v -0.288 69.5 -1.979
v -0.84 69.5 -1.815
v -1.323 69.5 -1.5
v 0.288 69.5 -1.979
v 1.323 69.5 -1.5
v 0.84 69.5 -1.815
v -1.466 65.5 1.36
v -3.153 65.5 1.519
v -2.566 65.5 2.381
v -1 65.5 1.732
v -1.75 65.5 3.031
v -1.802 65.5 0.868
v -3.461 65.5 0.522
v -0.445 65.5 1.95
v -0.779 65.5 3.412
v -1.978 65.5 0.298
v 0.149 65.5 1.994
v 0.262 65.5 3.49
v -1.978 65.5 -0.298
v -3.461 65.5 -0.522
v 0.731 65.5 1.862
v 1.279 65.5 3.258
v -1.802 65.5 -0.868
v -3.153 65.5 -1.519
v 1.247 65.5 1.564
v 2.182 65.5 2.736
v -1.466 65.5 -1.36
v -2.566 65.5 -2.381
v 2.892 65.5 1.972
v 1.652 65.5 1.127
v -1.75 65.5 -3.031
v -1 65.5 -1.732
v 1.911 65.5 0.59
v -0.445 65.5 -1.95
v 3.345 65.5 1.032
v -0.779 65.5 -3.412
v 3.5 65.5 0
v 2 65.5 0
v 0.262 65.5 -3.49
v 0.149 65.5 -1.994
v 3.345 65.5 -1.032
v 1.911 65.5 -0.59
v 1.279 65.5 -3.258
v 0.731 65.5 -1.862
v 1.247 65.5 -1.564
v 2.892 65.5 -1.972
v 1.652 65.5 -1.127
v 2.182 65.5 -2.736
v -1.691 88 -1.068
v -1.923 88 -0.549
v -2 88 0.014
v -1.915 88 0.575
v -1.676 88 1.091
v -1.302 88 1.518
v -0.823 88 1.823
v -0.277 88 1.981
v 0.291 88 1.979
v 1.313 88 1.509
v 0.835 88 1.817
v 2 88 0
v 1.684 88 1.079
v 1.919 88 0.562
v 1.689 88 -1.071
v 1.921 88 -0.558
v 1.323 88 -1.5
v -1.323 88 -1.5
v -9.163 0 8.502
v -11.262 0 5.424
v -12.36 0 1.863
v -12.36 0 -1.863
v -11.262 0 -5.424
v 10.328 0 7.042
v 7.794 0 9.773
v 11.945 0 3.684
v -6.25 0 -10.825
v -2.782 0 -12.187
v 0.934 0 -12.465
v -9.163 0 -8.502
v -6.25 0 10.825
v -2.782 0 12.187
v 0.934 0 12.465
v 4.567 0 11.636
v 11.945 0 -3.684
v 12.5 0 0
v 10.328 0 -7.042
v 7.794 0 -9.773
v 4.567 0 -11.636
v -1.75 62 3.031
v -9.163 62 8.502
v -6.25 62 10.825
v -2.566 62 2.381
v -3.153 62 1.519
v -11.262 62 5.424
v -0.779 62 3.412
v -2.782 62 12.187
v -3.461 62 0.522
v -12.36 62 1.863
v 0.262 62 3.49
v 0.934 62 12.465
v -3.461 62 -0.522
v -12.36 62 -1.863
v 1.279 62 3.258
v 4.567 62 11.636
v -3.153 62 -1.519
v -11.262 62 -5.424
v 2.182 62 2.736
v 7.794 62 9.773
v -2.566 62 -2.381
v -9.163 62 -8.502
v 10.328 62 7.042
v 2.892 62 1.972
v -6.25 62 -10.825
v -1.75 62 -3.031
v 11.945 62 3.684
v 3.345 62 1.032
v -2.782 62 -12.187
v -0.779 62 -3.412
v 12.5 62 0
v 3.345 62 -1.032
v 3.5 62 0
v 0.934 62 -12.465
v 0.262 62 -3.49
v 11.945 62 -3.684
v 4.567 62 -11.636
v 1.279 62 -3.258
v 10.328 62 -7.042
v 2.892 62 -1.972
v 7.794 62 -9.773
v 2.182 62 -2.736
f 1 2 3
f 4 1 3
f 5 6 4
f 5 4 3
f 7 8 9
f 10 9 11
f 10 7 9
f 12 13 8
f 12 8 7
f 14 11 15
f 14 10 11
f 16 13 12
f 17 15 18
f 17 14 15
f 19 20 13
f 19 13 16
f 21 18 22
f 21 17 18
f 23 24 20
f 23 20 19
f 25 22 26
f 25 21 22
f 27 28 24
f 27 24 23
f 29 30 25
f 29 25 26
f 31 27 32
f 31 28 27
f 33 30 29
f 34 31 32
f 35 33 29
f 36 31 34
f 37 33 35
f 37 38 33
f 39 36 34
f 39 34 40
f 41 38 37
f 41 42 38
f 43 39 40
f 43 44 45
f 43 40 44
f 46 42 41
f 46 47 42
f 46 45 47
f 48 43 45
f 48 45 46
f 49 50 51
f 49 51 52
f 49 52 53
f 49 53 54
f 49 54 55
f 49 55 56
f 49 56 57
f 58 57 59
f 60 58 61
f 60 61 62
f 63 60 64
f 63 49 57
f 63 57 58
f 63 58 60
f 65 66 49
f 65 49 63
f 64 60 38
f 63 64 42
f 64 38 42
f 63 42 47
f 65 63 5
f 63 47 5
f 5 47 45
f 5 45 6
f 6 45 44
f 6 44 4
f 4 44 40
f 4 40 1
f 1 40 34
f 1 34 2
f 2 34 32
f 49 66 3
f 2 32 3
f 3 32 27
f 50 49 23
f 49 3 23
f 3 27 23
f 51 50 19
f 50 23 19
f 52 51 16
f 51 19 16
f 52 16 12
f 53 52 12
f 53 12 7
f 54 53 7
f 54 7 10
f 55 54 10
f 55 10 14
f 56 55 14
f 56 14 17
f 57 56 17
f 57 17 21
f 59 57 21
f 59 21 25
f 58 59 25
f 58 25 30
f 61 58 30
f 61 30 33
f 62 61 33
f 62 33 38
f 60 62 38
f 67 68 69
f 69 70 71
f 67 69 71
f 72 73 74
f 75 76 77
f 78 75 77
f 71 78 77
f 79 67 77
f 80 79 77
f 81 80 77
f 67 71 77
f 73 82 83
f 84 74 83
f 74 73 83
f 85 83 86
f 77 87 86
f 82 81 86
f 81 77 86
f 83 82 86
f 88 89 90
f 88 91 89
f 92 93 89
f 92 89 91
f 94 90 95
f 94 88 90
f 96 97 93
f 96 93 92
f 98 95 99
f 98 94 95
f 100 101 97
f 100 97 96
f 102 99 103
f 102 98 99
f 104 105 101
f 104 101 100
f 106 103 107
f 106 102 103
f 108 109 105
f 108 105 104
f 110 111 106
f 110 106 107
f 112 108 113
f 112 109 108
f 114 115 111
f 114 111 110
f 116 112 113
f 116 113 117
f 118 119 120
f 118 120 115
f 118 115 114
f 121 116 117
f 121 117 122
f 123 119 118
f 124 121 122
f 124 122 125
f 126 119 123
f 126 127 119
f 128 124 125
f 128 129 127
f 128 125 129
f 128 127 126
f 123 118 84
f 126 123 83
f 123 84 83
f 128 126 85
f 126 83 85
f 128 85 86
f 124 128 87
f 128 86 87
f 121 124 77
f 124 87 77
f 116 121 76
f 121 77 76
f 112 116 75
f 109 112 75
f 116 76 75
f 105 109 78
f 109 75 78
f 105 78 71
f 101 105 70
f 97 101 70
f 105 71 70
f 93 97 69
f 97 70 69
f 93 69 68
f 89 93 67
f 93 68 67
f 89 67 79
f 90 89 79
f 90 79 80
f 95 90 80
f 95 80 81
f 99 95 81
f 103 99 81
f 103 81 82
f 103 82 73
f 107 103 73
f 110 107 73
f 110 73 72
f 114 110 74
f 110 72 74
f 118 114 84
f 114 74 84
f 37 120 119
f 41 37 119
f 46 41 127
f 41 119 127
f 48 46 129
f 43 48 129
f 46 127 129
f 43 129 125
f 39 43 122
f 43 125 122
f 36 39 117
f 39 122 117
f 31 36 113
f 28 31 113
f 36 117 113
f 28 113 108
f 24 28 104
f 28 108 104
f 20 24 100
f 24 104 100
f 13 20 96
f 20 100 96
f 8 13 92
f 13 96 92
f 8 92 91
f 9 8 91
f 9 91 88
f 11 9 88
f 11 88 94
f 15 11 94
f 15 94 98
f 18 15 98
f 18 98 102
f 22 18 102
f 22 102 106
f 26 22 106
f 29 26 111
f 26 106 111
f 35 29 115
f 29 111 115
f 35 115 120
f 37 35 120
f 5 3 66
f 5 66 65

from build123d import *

# Parameters (mm, degrees)
SKETCH_1_R          = 12.5
EXTRUDE_1_DEPTH     = 62
SKETCH_2_R          = 3.5
EXTRUDE_2_DEPTH     = 3.5
SKETCH_3_R          = 2
EXTRUDE_3_DEPTH     = 22.5
CUT_EXTRUDE_1_DEPTH = 18.5


with BuildPart() as part:
    # 草图1 → 凸台-拉伸1 (new body)
    with BuildSketch(Plane(origin=(0, 0, 0), x_dir=(1, 0, 0), z_dir=(0, 1, 0))):
        Circle(SKETCH_1_R)
    extrude(amount=EXTRUDE_1_DEPTH)

    # 草图2 → 凸台-拉伸2 (add)
    with BuildSketch(Plane(origin=(0, 62, 0), x_dir=(1, 0, 0), z_dir=(0, 1, 0))):
        Circle(SKETCH_2_R)
    extrude(amount=EXTRUDE_2_DEPTH)

    # 草图3 → 凸台-拉伸3 (add)
    with BuildSketch(Plane(origin=(0, 65.5, 0), x_dir=(1, 0, 0), z_dir=(0, 1, 0))):
        Circle(SKETCH_3_R)
    extrude(amount=EXTRUDE_3_DEPTH)

    # 草图4 → 切除-拉伸1 (cut)
    with BuildSketch(Plane(origin=(0, 88, 0), x_dir=(1, 0, 0), z_dir=(0, 1, 0))):
        Polygon((-50.671161076, 1.5), (-1.322875656, 1.5), (1.322875656, 1.5), (50.671161076, 1.5), (50.671161076, 100.196570842), (-50.671161076, 100.196570842), align=None)
    extrude(amount=-CUT_EXTRUDE_1_DEPTH, mode=Mode.SUBTRACT)


solid = part.part
